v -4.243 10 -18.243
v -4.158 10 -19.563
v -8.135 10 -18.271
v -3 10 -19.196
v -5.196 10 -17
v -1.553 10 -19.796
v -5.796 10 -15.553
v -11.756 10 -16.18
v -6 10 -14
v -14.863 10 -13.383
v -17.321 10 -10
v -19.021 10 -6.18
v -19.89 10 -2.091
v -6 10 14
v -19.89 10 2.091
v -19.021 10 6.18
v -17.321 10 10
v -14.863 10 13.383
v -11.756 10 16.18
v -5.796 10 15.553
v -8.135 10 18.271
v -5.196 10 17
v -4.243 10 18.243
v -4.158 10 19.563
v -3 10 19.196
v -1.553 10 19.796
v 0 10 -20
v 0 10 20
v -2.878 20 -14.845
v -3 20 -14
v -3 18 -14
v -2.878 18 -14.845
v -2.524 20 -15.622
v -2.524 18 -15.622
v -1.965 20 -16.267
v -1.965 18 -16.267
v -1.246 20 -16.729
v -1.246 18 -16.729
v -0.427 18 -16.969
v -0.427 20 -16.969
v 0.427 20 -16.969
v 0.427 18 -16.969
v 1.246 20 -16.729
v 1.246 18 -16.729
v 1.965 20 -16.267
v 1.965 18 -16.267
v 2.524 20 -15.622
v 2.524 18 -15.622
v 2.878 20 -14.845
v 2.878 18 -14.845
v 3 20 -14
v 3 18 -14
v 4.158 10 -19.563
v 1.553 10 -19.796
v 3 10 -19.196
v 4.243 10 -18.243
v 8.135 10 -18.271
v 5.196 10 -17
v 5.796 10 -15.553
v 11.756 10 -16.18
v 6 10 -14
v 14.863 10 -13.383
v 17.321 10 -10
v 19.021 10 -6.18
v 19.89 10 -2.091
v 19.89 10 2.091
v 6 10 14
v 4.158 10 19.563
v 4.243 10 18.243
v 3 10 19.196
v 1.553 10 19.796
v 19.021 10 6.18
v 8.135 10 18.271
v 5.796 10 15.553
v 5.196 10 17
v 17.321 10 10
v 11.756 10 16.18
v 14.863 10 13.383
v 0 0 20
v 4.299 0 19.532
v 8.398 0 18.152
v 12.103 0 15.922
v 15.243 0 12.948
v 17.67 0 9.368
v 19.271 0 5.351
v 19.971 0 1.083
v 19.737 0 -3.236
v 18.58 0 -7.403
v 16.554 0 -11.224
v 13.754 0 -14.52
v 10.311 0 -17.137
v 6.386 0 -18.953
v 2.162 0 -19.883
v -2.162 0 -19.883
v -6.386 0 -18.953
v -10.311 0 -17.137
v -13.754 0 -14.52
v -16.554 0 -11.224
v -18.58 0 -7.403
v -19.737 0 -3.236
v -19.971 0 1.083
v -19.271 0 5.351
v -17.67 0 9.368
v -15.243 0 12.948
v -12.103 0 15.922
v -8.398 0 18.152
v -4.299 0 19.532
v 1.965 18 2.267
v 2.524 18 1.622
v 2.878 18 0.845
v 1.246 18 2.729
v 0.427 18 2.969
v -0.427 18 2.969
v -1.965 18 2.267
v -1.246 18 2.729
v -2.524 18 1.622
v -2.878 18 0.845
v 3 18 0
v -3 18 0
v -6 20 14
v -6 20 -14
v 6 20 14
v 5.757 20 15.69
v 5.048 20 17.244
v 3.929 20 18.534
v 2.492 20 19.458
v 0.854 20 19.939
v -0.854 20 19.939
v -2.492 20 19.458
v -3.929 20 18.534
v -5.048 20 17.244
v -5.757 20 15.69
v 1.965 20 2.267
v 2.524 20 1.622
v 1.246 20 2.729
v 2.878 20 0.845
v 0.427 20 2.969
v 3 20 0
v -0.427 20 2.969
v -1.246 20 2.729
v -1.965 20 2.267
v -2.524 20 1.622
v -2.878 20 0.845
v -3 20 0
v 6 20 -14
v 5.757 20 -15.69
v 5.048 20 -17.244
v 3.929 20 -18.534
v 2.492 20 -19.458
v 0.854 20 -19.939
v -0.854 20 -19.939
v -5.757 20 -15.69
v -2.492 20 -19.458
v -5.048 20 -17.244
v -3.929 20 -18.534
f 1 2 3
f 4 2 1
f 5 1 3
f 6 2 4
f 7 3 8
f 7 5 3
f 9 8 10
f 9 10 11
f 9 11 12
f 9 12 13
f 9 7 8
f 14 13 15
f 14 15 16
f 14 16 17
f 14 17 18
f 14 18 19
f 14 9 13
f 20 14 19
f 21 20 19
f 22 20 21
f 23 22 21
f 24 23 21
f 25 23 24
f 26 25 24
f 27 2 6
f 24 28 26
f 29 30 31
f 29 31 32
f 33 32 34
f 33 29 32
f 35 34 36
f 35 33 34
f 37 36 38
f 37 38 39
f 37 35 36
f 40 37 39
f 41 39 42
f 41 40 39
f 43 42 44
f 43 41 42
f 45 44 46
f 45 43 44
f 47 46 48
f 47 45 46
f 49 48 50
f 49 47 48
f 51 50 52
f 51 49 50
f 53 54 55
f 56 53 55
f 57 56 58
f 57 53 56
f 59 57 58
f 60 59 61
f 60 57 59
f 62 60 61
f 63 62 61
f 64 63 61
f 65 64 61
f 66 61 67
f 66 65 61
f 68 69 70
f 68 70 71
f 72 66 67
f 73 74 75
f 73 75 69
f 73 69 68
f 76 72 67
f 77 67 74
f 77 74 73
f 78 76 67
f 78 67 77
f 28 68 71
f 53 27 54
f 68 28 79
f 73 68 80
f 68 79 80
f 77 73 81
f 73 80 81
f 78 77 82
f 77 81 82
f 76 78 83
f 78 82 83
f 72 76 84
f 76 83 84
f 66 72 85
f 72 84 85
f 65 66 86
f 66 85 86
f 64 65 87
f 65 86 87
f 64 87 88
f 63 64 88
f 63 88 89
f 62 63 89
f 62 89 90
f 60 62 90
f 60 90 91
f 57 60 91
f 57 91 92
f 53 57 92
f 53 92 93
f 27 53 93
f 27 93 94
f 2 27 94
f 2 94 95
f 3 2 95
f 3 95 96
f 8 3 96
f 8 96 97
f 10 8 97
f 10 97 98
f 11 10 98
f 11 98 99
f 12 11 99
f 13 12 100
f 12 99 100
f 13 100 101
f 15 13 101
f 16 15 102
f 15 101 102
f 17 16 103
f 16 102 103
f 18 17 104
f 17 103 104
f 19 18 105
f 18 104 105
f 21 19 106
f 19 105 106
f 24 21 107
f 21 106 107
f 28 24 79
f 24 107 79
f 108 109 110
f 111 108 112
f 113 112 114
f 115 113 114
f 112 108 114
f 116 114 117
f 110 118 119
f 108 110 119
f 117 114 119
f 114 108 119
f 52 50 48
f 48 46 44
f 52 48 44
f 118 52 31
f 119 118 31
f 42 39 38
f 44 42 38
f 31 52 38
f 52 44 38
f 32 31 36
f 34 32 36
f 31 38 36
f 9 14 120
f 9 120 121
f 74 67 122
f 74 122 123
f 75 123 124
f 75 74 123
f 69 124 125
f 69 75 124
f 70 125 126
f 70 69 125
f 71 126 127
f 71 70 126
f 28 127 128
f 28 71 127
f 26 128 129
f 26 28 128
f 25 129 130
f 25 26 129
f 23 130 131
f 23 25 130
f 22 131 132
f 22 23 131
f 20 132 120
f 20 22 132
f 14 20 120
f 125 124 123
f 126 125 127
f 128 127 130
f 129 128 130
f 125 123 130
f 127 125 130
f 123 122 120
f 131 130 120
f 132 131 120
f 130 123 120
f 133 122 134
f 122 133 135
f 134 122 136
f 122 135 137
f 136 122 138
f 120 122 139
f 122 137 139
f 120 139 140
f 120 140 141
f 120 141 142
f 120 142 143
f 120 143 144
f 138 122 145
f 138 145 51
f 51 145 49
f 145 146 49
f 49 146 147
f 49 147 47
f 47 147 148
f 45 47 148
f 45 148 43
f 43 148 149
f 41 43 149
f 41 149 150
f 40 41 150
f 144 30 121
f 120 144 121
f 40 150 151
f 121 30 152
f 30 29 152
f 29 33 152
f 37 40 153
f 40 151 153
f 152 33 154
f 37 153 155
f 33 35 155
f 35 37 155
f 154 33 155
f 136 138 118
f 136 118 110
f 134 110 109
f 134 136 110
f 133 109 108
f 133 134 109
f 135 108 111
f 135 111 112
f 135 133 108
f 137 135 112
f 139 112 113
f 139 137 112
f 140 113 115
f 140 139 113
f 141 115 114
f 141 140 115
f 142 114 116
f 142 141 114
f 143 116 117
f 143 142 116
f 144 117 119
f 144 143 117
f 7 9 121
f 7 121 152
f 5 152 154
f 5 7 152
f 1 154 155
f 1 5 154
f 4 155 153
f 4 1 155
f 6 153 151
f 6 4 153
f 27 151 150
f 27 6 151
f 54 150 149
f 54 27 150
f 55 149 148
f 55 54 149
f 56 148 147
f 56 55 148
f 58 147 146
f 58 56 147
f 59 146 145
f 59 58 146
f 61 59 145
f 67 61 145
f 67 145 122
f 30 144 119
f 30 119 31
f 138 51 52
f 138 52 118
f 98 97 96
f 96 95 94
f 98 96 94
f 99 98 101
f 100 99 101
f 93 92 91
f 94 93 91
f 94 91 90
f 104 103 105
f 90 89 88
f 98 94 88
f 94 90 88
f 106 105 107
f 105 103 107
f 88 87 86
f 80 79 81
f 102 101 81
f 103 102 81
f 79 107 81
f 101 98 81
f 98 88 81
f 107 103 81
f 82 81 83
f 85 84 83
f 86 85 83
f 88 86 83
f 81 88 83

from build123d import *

# Parameters (mm, degrees)
SKETCH_1_R          = 20
EXTRUDE_1_DEPTH     = 10
EXTRUDE_2_DEPTH     = 10
CUT_EXTRUDE_1_DEPTH = 2


with BuildPart() as part:
    # 스케치1 → 보스-돌출1 (new body)
    with BuildSketch(Plane(origin=(0, 0, 0), x_dir=(1, 0, 0), z_dir=(0, 1, 0))):
        with Locations(Location((0, 0, 0), (0, 0, 270))):
            Circle(SKETCH_1_R)
    extrude(amount=EXTRUDE_1_DEPTH)

    # 스케치2 → 보스-돌출2 (add)
    with BuildSketch(Plane(origin=(0, 10, 0), x_dir=(1, 0, 0), z_dir=(0, 1, 0))):
        with BuildLine():
            Line((6, 14), (6, -14))
            ThreePointArc((6, -14), (0, -20), (-6, -14))
            Line((-6, -14), (-6, 14))
            ThreePointArc((-6, 14), (0, 20), (6, 14))
        make_face()
    extrude(amount=EXTRUDE_2_DEPTH)

    # 스케치3 → 컷-돌출1 (cut)
    with BuildSketch(Plane(origin=(0, 20, 0), x_dir=(1, 0, 0), z_dir=(0, 1, 0))):
        with BuildLine():
            Line((3, 14), (3, 0))
            ThreePointArc((3, 0), (0, -3), (-3, 0))
            Line((-3, 0), (-3, 14))
            ThreePointArc((-3, 14), (0, 17), (3, 14))
        make_face()
    extrude(amount=-CUT_EXTRUDE_1_DEPTH, mode=Mode.SUBTRACT)


solid = part.part
